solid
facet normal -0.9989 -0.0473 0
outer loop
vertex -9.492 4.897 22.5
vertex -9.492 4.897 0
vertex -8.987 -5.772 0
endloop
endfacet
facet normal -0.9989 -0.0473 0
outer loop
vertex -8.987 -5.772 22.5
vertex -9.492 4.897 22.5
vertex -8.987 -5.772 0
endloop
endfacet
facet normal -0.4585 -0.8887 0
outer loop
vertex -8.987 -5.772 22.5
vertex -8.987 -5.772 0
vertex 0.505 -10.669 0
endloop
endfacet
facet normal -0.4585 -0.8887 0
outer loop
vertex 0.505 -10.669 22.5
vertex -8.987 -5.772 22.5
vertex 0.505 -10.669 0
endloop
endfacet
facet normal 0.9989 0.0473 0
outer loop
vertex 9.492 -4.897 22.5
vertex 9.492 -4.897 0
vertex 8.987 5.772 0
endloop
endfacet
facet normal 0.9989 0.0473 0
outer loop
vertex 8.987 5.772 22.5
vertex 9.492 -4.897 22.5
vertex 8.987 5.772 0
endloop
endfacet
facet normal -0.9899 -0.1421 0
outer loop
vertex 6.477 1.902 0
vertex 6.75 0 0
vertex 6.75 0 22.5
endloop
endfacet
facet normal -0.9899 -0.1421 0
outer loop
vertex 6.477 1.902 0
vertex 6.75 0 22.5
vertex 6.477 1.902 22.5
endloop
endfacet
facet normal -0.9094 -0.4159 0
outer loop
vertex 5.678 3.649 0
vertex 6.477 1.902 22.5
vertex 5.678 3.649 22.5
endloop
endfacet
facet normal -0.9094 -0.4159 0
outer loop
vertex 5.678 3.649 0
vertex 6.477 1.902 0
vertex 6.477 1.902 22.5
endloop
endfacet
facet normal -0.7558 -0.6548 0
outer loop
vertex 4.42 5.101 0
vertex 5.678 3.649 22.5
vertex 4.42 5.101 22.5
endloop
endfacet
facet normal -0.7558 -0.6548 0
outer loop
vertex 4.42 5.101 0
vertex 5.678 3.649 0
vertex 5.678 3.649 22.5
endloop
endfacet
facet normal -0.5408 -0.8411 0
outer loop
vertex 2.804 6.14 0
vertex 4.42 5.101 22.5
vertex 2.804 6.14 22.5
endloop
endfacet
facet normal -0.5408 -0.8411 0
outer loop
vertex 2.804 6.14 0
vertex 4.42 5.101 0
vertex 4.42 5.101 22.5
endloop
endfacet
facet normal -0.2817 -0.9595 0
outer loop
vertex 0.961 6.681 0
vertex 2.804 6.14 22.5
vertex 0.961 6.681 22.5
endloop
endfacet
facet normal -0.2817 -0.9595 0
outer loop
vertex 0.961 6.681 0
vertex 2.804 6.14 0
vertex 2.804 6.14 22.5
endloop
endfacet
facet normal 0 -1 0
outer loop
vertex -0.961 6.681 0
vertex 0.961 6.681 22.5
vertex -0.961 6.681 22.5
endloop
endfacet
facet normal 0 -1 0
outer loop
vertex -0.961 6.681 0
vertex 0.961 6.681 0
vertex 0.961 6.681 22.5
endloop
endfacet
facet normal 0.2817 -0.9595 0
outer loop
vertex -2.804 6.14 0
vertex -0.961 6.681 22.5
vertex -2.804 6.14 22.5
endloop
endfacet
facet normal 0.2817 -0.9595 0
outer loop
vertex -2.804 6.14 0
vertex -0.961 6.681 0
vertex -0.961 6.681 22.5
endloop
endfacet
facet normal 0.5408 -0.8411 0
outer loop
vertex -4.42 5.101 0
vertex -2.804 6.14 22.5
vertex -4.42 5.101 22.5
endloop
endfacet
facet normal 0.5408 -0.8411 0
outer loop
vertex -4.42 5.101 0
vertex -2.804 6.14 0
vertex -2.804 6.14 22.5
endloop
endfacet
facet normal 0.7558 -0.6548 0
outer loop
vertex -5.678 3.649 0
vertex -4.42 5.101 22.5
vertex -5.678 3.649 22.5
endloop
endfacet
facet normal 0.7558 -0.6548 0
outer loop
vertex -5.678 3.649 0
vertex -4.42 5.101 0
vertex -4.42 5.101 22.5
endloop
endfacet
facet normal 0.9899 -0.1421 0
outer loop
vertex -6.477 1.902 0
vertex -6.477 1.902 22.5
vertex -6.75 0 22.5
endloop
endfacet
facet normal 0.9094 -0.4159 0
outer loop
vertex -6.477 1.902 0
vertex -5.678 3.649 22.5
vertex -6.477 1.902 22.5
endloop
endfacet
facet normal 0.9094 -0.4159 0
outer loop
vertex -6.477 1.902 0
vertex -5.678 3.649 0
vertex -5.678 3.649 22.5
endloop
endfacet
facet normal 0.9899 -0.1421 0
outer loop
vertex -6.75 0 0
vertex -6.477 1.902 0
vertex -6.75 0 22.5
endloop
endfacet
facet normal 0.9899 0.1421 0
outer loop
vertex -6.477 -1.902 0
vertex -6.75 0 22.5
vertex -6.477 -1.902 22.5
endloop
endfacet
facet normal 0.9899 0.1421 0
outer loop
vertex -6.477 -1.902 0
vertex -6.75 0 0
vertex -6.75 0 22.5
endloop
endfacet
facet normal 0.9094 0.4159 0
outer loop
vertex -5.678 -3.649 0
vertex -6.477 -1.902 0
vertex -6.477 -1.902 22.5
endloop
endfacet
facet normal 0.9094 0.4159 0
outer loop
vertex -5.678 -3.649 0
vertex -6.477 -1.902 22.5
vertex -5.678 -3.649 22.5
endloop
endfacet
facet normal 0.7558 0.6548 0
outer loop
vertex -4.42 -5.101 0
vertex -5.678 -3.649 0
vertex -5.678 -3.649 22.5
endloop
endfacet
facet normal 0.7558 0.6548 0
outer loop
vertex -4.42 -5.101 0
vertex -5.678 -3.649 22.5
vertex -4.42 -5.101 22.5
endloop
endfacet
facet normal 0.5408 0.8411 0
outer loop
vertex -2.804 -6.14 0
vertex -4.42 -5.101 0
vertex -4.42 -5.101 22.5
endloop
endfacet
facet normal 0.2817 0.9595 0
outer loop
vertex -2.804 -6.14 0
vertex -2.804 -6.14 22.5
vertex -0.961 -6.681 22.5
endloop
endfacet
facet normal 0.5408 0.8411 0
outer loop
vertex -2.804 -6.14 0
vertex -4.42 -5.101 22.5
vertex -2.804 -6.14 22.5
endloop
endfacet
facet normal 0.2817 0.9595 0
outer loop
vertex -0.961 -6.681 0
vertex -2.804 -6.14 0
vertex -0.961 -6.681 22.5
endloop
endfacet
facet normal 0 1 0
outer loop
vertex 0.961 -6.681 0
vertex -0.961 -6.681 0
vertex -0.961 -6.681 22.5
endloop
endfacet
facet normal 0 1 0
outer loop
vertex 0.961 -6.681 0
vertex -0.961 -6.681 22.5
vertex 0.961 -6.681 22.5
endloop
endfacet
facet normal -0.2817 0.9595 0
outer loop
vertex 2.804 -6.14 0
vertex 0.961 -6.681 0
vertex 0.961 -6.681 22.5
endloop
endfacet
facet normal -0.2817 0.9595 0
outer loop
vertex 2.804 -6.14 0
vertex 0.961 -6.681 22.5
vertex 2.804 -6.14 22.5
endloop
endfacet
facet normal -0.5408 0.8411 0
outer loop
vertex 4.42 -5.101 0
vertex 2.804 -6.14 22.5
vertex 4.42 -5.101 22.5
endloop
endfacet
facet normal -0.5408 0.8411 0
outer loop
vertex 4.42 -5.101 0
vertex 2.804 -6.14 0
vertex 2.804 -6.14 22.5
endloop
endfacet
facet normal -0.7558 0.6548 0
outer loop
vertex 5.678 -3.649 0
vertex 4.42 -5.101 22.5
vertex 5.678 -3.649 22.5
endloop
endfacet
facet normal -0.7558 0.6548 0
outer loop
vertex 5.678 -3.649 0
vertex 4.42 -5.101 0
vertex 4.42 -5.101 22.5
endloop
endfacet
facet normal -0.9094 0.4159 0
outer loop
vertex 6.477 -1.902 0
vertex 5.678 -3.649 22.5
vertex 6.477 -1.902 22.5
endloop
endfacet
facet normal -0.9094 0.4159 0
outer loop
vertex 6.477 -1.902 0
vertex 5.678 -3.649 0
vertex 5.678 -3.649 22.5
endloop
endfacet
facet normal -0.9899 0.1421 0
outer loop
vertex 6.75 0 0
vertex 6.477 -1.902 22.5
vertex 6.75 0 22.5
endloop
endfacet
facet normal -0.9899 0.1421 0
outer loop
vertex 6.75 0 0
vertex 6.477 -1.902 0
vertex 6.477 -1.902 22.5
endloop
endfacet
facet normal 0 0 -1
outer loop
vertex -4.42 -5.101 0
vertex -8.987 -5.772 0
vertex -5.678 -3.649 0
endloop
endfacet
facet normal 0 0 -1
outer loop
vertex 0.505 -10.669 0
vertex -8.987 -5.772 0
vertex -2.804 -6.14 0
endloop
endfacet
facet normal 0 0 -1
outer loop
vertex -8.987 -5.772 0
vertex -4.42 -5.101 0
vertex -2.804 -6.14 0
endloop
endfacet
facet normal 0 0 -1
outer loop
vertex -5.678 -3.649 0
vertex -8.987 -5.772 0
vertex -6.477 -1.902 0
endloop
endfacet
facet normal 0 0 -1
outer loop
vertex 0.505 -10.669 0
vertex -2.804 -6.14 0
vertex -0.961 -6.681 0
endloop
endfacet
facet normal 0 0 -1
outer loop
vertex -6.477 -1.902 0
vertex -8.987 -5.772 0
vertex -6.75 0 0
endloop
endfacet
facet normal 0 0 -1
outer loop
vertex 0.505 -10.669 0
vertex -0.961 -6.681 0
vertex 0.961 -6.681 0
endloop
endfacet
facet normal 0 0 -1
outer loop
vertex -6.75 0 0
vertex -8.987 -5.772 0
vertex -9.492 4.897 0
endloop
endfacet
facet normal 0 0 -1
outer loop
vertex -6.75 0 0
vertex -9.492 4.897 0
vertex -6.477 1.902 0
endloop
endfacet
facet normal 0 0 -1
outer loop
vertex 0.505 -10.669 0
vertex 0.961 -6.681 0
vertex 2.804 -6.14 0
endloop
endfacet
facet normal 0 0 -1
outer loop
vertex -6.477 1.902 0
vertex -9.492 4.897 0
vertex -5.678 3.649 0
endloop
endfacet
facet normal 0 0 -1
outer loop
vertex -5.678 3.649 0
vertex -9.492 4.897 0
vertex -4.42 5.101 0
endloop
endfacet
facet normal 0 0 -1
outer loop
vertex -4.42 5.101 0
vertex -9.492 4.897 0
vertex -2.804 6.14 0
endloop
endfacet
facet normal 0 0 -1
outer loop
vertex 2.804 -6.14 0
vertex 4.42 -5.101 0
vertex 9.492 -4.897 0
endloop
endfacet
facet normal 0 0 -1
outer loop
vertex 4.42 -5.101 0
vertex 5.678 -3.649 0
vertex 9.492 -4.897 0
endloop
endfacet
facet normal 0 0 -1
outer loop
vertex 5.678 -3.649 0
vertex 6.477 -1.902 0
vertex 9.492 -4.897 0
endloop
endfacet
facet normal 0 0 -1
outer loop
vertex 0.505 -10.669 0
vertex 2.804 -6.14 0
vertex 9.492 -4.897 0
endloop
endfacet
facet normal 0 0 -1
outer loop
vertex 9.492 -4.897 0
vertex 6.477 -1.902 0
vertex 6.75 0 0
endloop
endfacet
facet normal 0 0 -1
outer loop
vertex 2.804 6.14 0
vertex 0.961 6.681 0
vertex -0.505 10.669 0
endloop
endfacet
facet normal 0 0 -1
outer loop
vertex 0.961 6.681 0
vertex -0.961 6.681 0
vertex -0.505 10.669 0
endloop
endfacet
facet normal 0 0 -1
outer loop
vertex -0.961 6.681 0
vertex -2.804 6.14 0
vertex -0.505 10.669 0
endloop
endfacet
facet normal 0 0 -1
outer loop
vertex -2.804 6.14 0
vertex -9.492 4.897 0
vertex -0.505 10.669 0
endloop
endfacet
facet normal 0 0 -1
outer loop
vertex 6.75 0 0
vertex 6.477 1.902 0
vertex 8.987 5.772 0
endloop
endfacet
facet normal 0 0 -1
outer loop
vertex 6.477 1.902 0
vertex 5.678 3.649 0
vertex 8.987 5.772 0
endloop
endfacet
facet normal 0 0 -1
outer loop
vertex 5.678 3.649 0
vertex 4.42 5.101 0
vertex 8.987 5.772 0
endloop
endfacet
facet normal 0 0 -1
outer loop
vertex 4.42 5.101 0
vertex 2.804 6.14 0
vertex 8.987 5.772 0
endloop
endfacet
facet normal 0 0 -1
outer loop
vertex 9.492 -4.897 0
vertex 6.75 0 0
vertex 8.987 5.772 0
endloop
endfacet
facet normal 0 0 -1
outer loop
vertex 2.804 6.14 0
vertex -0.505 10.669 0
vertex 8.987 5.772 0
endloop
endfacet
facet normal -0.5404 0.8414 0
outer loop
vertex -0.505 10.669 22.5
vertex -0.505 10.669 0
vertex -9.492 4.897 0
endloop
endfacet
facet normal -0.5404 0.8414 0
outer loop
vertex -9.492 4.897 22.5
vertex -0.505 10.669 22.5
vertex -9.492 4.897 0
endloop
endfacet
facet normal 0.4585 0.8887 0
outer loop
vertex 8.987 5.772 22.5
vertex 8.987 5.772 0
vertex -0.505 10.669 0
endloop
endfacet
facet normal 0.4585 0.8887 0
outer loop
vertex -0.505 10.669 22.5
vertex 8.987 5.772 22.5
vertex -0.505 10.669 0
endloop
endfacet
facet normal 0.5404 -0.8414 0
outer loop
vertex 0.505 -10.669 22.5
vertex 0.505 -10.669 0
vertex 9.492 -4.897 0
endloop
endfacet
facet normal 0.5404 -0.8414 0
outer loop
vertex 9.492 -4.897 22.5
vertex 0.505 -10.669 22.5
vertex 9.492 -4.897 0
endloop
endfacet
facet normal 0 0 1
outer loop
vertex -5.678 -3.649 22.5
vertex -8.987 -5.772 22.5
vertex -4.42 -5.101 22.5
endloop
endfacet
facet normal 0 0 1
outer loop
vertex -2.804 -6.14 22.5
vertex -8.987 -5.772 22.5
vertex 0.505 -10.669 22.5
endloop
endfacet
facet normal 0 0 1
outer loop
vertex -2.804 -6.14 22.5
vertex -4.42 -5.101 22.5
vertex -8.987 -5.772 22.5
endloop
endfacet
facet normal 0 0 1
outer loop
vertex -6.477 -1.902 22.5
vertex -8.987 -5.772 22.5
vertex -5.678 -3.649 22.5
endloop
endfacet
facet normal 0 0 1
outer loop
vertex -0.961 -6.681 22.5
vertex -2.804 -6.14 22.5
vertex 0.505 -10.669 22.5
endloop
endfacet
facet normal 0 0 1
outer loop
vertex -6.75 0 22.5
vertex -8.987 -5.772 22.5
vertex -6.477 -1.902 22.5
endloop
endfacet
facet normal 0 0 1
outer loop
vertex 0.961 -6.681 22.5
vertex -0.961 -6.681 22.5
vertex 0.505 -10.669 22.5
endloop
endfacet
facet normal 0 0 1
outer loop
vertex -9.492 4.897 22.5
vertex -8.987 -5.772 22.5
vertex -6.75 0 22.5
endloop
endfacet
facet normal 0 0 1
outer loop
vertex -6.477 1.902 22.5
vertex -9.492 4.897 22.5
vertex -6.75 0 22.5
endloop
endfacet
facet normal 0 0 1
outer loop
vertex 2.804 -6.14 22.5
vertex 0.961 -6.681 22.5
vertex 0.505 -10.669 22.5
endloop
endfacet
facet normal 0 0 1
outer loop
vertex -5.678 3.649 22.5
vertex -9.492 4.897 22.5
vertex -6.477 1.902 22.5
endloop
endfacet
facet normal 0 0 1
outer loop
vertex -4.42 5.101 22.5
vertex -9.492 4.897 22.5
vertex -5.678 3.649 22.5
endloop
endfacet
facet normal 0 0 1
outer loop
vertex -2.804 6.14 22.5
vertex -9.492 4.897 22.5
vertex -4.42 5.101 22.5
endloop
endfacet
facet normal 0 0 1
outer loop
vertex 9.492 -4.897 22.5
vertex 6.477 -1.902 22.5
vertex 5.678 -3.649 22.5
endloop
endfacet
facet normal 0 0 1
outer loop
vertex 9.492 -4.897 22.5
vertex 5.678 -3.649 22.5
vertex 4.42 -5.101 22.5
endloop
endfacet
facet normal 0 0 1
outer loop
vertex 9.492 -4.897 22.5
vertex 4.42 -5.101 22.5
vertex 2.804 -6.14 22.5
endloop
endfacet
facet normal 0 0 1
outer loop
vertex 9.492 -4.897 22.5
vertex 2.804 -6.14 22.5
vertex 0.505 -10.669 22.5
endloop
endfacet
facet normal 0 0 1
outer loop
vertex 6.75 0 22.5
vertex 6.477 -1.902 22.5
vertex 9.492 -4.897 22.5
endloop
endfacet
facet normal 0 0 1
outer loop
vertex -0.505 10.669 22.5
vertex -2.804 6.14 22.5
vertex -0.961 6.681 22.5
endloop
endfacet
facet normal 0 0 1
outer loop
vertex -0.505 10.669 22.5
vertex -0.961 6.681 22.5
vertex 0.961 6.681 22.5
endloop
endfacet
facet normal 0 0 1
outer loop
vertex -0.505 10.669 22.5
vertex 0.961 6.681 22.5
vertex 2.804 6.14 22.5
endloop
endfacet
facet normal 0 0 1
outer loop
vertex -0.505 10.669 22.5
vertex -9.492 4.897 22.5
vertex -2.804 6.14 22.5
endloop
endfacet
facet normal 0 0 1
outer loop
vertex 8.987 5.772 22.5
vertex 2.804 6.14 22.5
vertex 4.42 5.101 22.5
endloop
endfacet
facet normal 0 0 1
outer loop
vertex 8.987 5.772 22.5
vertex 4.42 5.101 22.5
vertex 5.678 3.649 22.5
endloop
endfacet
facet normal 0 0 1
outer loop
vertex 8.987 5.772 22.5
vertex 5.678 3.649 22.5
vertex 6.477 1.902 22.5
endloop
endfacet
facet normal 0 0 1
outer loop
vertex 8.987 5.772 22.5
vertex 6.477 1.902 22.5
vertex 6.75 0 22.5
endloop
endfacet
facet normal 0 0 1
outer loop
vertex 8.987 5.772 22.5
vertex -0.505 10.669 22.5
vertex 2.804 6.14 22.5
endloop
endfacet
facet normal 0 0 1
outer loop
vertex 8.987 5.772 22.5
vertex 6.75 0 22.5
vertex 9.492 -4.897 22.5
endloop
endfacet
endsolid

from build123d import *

# Parameters (mm, degrees)
F2_DEPTH = 22.5
F3_R     = 6.75
F4_DEPTH = 25


with BuildPart() as f2:
    # F0 (on Top) → F2 (new body)
    with BuildSketch(Plane.XY):
        Polygon((-0.505125, 10.669029), (-9.492213, 4.897064), (-8.987088, -5.771965), (0.505125, -10.669029), (9.492213, -4.897064), (8.987088, 5.771965), align=None)
    extrude(amount=F2_DEPTH)

    # F3 (on face) → F4 (cut)
    with BuildSketch(Plane.XY):
        Circle(F3_R)
    extrude(amount=F4_DEPTH, mode=Mode.SUBTRACT)


solid = f2.part
